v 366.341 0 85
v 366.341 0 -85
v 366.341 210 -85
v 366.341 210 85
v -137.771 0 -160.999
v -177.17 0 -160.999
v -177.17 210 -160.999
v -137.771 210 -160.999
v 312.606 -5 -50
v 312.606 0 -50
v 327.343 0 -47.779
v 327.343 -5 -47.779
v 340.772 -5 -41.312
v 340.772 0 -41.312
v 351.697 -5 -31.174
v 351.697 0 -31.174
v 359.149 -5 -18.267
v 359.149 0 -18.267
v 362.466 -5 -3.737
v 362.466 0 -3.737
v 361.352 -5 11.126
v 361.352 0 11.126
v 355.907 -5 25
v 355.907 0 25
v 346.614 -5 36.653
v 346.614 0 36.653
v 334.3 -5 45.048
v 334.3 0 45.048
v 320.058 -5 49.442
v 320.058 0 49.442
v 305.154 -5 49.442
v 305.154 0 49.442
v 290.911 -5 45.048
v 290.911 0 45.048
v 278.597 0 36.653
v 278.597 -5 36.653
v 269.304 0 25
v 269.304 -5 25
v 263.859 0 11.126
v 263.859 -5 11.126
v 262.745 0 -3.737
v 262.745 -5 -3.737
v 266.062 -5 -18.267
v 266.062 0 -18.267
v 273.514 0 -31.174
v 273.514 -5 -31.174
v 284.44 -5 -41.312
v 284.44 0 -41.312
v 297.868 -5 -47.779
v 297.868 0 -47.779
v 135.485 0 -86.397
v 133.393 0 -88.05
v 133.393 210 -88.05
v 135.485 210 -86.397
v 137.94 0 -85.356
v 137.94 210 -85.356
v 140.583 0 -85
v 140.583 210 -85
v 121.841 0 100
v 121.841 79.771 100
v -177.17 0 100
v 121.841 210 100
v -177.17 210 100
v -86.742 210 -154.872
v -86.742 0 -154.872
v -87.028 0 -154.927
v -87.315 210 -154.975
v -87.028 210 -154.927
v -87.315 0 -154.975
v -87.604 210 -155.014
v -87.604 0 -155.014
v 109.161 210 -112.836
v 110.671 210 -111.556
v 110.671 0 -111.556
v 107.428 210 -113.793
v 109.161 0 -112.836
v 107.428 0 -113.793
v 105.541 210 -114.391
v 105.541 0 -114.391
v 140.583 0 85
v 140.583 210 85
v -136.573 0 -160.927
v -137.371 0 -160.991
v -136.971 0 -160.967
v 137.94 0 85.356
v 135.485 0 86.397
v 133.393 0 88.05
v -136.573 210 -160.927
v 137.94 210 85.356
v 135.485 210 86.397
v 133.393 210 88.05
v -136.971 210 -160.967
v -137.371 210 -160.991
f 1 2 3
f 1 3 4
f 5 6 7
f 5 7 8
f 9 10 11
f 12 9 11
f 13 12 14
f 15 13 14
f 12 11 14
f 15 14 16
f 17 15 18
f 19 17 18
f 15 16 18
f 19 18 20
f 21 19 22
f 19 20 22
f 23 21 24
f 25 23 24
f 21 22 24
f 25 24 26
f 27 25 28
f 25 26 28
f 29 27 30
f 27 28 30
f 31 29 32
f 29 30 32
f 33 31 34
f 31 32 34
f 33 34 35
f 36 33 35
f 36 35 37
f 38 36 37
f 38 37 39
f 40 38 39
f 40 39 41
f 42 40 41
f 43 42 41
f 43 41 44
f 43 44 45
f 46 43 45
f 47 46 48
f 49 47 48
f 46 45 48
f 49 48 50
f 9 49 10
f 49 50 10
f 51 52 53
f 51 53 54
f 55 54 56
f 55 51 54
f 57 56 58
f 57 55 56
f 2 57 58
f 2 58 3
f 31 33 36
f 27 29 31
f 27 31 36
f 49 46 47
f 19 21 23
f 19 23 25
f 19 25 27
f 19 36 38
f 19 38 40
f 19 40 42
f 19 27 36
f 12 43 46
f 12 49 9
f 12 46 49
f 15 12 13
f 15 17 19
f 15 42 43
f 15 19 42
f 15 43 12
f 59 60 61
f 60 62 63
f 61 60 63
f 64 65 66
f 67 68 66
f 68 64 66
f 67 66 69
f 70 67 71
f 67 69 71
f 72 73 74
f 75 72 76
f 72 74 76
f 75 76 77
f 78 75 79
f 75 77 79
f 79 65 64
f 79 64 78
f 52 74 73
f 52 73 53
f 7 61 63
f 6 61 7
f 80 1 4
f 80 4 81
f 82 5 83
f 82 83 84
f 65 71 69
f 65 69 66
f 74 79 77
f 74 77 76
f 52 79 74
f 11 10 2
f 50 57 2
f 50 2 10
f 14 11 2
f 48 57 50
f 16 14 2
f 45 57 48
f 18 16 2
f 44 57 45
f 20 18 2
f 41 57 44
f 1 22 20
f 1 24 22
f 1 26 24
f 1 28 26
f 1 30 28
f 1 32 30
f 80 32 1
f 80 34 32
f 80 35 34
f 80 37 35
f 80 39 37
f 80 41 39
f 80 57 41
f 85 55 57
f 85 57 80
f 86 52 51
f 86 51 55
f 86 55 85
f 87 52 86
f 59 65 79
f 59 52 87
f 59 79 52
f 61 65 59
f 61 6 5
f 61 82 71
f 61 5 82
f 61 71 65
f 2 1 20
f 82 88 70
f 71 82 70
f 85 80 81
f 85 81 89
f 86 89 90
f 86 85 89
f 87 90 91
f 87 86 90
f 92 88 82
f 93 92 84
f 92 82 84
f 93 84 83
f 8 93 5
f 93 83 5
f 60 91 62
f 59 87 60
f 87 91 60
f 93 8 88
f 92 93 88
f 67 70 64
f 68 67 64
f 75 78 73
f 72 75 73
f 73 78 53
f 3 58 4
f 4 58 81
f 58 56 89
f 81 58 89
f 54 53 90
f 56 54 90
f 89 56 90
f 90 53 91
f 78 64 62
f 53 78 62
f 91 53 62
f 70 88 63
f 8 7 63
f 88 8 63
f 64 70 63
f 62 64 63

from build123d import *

# Parameters (mm, degrees)
BOSS_EXTRUDE1_DEPTH     = 210
CUT_EXTRUDE1_DEPTH      = 60
FILLET1_R               = 10
FILLET2_R               = 10
SKETCH3_R               = 50
BOSS_EXTRUDE2_DEPTH     = 5
CUT_EXTRUDE2_DEPTH      = 452.914312828
CUT_EXTRUDE2_DEPTH_BACK = 452.914312828
SKETCH4_W               = 303.312029478
SKETCH4_H               = 103.575222475


with BuildPart() as part:
    # Sketch1 → Boss-Extrude1 (new body)
    with BuildSketch(Plane(origin=(0, 0, 0), x_dir=(1, 0, 0), z_dir=(0, 1, 0))):
        Polygon((-177.169811321, 160.999367101), (-137.169811321, 160.999367101), (-87.169811321, 154.961631252), (108.540145677, 113.759535042), (136.34102955, 85), (366.34102955, 85), (366.34102955, -85), (136.34102955, -85), (108.540145677, -113.759535042), (-87.169811321, -154.961631252), (-137.169811321, -160.999367101), (-177.169811321, -160.999367101), align=None)
    extrude(amount=BOSS_EXTRUDE1_DEPTH)

    # Sketch2 → Cut-Extrude1 (cut)
    with BuildSketch(Plane.XY.offset(160)):
        Polygon((-177.169811321, 0), (366.34102955, 145), (366.34102955, 0), align=None)
    extrude(amount=-CUT_EXTRUDE1_DEPTH, mode=Mode.SUBTRACT)

    # Fillet1
    # the kernel refuses this fillet: 10 mm, written as the material it adds along each edge
    with BuildSketch(Plane(origin=(136.34102955, 0, 85), x_dir=(-0.6950220968474797, 0, 0.7189883760491075), z_dir=(0, 1, 0))) as fillet1_piece_1:
        with BuildLine():
            CenterArc((FILLET1_R * 0.424176403002, FILLET1_R), FILLET1_R, 224.028978069, 45.971021931)
            Line((-FILLET1_R * 0.294811973047, FILLET1_R * 0.304977903153), (0, 0))
            Line((0, 0), (FILLET1_R * 0.424176403002, 0))
        make_face()
    extrude(amount=210)
    # the kernel refuses this fillet: 10 mm, written as the material it takes off along each edge
    with BuildSketch(Plane(origin=(108.540145677, 68.559927222, 113.759535042), x_dir=(0.6950220968474767, 0, -0.7189883760491101), z_dir=(0, 1, 0))) as fillet1_2_piece_1:
        with BuildLine():
            CenterArc((FILLET1_R * 0.306516798333, FILLET1_R), FILLET1_R, 235.917636109, 34.082363891)
            Line((-FILLET1_R * 0.253867285946, FILLET1_R * 0.17176713535), (0, 0))
            Line((0, 0), (FILLET1_R * 0.306516798333, 0))
        make_face()
    extrude(amount=149.102992736, mode=Mode.SUBTRACT)
    with BuildSketch(Plane(origin=(-87.169811321, 22.918324442, 154.961631252), x_dir=(0.9785497849867442, 0, -0.20601048104986486), z_dir=(0, 1, 0))) as fillet1_2_piece_2:
        with BuildLine():
            CenterArc((FILLET1_R * 0.0436894476987, FILLET1_R), FILLET1_R, 264.996739811, 5.003260189)
            Line((-FILLET1_R * 0.0435229794225, FILLET1_R * 0.00381026277338), (0, 0))
            Line((0, 0), (FILLET1_R * 0.0436894476986, 0))
        make_face()
    extrude(amount=188.173911751, mode=Mode.SUBTRACT)
    with BuildSketch(Plane(origin=(-137.169811321, -1.50397119, 160.999367101), x_dir=(-1, 0, 0), z_dir=(0, 1, 0))) as fillet1_2_piece_3:
        with BuildLine():
            CenterArc((FILLET1_R * 0.0601588475808, -FILLET1_R), FILLET1_R, 90, 6.88539785)
            Line((-FILLET1_R * 0.0597249775946, -FILLET1_R * 0.00721207276614), (0, 0))
            Line((0, 0), (FILLET1_R * 0.0601588475808, 0))
        make_face()
    extrude(amount=213.007942379, mode=Mode.SUBTRACT)

    # Fillet2
    # the kernel refuses this fillet: 10 mm, written as the material it adds along each edge
    with BuildSketch(Plane(origin=(136.34102955, 0, -85), x_dir=(-0.695022096847478, 0, -0.7189883760491093), z_dir=(0, 1, 0))) as fillet2_piece_1:
        with BuildLine():
            CenterArc((FILLET2_R * 0.424176403002, -FILLET2_R), FILLET2_R, 90, 45.971021931)
            Line((-FILLET2_R * 0.294811973047, -FILLET2_R * 0.304977903153), (0, 0))
            Line((0, 0), (FILLET2_R * 0.424176403002, 0))
        make_face()
    extrude(amount=210)
    # the kernel refuses this fillet: 10 mm, written as the material it takes off along each edge
    with BuildSketch(Plane(origin=(-137.169811321, -1.50397119, -160.999367101), x_dir=(-1, 0, 0), z_dir=(0, 1, 0))) as fillet2_2_piece_1:
        with BuildLine():
            CenterArc((FILLET2_R * 0.0601588475808, FILLET2_R), FILLET2_R, 263.11460215, 6.88539785)
            Line((-FILLET2_R * 0.0597249775946, FILLET2_R * 0.00721207276614), (0, 0))
            Line((0, 0), (FILLET2_R * 0.0601588475808, 0))
        make_face()
    extrude(amount=213.007942379, mode=Mode.SUBTRACT)
    with BuildSketch(Plane(origin=(-87.169811321, -1.092236192, -154.961631252), x_dir=(-0.9927879272338658, 0, -0.11988382517539375), z_dir=(0, 1, 0))) as fillet2_2_piece_2:
        with BuildLine():
            CenterArc((FILLET2_R * 0.0436894476987, FILLET2_R), FILLET2_R, 264.996739811, 5.003260189)
            Line((-FILLET2_R * 0.0435229794225, FILLET2_R * 0.00381026277338), (0, 0))
            Line((0, 0), (FILLET2_R * 0.0436894476986, 0))
        make_face()
    extrude(amount=212.184472385, mode=Mode.SUBTRACT)
    with BuildSketch(Plane(origin=(108.540145677, -7.662919958, -113.759535042), x_dir=(-0.9785497849867494, 0, -0.20601048104984027), z_dir=(0, 1, 0))) as fillet2_2_piece_3:
        with BuildLine():
            CenterArc((FILLET2_R * 0.306516798333, FILLET2_R), FILLET2_R, 235.917636109, 34.082363891)
            Line((-FILLET2_R * 0.253867285946, FILLET2_R * 0.17176713535), (0, 0))
            Line((0, 0), (FILLET2_R * 0.306516798333, 0))
        make_face()
    extrude(amount=225.325839917, mode=Mode.SUBTRACT)

    # Sketch3 → Boss-Extrude2 (add)
    with BuildSketch(Plane.XZ):
        with Locations(Location((312.605658758, 0, 0), (0, 0, 270))):
            Circle(SKETCH3_R)
    extrude(amount=BOSS_EXTRUDE2_DEPTH)

    # Sketch4 → Cut-Extrude2 (cut, two sides: drawn at the far end of the back side and taken through both)
    with BuildSketch(Plane.XZ.offset(-CUT_EXTRUDE2_DEPTH_BACK)):
        with Locations((-25.513796582, 151.787611238)):
            Rectangle(SKETCH4_W, SKETCH4_H)
    extrude(amount=CUT_EXTRUDE2_DEPTH + CUT_EXTRUDE2_DEPTH_BACK, mode=Mode.SUBTRACT)


solid = part.part
